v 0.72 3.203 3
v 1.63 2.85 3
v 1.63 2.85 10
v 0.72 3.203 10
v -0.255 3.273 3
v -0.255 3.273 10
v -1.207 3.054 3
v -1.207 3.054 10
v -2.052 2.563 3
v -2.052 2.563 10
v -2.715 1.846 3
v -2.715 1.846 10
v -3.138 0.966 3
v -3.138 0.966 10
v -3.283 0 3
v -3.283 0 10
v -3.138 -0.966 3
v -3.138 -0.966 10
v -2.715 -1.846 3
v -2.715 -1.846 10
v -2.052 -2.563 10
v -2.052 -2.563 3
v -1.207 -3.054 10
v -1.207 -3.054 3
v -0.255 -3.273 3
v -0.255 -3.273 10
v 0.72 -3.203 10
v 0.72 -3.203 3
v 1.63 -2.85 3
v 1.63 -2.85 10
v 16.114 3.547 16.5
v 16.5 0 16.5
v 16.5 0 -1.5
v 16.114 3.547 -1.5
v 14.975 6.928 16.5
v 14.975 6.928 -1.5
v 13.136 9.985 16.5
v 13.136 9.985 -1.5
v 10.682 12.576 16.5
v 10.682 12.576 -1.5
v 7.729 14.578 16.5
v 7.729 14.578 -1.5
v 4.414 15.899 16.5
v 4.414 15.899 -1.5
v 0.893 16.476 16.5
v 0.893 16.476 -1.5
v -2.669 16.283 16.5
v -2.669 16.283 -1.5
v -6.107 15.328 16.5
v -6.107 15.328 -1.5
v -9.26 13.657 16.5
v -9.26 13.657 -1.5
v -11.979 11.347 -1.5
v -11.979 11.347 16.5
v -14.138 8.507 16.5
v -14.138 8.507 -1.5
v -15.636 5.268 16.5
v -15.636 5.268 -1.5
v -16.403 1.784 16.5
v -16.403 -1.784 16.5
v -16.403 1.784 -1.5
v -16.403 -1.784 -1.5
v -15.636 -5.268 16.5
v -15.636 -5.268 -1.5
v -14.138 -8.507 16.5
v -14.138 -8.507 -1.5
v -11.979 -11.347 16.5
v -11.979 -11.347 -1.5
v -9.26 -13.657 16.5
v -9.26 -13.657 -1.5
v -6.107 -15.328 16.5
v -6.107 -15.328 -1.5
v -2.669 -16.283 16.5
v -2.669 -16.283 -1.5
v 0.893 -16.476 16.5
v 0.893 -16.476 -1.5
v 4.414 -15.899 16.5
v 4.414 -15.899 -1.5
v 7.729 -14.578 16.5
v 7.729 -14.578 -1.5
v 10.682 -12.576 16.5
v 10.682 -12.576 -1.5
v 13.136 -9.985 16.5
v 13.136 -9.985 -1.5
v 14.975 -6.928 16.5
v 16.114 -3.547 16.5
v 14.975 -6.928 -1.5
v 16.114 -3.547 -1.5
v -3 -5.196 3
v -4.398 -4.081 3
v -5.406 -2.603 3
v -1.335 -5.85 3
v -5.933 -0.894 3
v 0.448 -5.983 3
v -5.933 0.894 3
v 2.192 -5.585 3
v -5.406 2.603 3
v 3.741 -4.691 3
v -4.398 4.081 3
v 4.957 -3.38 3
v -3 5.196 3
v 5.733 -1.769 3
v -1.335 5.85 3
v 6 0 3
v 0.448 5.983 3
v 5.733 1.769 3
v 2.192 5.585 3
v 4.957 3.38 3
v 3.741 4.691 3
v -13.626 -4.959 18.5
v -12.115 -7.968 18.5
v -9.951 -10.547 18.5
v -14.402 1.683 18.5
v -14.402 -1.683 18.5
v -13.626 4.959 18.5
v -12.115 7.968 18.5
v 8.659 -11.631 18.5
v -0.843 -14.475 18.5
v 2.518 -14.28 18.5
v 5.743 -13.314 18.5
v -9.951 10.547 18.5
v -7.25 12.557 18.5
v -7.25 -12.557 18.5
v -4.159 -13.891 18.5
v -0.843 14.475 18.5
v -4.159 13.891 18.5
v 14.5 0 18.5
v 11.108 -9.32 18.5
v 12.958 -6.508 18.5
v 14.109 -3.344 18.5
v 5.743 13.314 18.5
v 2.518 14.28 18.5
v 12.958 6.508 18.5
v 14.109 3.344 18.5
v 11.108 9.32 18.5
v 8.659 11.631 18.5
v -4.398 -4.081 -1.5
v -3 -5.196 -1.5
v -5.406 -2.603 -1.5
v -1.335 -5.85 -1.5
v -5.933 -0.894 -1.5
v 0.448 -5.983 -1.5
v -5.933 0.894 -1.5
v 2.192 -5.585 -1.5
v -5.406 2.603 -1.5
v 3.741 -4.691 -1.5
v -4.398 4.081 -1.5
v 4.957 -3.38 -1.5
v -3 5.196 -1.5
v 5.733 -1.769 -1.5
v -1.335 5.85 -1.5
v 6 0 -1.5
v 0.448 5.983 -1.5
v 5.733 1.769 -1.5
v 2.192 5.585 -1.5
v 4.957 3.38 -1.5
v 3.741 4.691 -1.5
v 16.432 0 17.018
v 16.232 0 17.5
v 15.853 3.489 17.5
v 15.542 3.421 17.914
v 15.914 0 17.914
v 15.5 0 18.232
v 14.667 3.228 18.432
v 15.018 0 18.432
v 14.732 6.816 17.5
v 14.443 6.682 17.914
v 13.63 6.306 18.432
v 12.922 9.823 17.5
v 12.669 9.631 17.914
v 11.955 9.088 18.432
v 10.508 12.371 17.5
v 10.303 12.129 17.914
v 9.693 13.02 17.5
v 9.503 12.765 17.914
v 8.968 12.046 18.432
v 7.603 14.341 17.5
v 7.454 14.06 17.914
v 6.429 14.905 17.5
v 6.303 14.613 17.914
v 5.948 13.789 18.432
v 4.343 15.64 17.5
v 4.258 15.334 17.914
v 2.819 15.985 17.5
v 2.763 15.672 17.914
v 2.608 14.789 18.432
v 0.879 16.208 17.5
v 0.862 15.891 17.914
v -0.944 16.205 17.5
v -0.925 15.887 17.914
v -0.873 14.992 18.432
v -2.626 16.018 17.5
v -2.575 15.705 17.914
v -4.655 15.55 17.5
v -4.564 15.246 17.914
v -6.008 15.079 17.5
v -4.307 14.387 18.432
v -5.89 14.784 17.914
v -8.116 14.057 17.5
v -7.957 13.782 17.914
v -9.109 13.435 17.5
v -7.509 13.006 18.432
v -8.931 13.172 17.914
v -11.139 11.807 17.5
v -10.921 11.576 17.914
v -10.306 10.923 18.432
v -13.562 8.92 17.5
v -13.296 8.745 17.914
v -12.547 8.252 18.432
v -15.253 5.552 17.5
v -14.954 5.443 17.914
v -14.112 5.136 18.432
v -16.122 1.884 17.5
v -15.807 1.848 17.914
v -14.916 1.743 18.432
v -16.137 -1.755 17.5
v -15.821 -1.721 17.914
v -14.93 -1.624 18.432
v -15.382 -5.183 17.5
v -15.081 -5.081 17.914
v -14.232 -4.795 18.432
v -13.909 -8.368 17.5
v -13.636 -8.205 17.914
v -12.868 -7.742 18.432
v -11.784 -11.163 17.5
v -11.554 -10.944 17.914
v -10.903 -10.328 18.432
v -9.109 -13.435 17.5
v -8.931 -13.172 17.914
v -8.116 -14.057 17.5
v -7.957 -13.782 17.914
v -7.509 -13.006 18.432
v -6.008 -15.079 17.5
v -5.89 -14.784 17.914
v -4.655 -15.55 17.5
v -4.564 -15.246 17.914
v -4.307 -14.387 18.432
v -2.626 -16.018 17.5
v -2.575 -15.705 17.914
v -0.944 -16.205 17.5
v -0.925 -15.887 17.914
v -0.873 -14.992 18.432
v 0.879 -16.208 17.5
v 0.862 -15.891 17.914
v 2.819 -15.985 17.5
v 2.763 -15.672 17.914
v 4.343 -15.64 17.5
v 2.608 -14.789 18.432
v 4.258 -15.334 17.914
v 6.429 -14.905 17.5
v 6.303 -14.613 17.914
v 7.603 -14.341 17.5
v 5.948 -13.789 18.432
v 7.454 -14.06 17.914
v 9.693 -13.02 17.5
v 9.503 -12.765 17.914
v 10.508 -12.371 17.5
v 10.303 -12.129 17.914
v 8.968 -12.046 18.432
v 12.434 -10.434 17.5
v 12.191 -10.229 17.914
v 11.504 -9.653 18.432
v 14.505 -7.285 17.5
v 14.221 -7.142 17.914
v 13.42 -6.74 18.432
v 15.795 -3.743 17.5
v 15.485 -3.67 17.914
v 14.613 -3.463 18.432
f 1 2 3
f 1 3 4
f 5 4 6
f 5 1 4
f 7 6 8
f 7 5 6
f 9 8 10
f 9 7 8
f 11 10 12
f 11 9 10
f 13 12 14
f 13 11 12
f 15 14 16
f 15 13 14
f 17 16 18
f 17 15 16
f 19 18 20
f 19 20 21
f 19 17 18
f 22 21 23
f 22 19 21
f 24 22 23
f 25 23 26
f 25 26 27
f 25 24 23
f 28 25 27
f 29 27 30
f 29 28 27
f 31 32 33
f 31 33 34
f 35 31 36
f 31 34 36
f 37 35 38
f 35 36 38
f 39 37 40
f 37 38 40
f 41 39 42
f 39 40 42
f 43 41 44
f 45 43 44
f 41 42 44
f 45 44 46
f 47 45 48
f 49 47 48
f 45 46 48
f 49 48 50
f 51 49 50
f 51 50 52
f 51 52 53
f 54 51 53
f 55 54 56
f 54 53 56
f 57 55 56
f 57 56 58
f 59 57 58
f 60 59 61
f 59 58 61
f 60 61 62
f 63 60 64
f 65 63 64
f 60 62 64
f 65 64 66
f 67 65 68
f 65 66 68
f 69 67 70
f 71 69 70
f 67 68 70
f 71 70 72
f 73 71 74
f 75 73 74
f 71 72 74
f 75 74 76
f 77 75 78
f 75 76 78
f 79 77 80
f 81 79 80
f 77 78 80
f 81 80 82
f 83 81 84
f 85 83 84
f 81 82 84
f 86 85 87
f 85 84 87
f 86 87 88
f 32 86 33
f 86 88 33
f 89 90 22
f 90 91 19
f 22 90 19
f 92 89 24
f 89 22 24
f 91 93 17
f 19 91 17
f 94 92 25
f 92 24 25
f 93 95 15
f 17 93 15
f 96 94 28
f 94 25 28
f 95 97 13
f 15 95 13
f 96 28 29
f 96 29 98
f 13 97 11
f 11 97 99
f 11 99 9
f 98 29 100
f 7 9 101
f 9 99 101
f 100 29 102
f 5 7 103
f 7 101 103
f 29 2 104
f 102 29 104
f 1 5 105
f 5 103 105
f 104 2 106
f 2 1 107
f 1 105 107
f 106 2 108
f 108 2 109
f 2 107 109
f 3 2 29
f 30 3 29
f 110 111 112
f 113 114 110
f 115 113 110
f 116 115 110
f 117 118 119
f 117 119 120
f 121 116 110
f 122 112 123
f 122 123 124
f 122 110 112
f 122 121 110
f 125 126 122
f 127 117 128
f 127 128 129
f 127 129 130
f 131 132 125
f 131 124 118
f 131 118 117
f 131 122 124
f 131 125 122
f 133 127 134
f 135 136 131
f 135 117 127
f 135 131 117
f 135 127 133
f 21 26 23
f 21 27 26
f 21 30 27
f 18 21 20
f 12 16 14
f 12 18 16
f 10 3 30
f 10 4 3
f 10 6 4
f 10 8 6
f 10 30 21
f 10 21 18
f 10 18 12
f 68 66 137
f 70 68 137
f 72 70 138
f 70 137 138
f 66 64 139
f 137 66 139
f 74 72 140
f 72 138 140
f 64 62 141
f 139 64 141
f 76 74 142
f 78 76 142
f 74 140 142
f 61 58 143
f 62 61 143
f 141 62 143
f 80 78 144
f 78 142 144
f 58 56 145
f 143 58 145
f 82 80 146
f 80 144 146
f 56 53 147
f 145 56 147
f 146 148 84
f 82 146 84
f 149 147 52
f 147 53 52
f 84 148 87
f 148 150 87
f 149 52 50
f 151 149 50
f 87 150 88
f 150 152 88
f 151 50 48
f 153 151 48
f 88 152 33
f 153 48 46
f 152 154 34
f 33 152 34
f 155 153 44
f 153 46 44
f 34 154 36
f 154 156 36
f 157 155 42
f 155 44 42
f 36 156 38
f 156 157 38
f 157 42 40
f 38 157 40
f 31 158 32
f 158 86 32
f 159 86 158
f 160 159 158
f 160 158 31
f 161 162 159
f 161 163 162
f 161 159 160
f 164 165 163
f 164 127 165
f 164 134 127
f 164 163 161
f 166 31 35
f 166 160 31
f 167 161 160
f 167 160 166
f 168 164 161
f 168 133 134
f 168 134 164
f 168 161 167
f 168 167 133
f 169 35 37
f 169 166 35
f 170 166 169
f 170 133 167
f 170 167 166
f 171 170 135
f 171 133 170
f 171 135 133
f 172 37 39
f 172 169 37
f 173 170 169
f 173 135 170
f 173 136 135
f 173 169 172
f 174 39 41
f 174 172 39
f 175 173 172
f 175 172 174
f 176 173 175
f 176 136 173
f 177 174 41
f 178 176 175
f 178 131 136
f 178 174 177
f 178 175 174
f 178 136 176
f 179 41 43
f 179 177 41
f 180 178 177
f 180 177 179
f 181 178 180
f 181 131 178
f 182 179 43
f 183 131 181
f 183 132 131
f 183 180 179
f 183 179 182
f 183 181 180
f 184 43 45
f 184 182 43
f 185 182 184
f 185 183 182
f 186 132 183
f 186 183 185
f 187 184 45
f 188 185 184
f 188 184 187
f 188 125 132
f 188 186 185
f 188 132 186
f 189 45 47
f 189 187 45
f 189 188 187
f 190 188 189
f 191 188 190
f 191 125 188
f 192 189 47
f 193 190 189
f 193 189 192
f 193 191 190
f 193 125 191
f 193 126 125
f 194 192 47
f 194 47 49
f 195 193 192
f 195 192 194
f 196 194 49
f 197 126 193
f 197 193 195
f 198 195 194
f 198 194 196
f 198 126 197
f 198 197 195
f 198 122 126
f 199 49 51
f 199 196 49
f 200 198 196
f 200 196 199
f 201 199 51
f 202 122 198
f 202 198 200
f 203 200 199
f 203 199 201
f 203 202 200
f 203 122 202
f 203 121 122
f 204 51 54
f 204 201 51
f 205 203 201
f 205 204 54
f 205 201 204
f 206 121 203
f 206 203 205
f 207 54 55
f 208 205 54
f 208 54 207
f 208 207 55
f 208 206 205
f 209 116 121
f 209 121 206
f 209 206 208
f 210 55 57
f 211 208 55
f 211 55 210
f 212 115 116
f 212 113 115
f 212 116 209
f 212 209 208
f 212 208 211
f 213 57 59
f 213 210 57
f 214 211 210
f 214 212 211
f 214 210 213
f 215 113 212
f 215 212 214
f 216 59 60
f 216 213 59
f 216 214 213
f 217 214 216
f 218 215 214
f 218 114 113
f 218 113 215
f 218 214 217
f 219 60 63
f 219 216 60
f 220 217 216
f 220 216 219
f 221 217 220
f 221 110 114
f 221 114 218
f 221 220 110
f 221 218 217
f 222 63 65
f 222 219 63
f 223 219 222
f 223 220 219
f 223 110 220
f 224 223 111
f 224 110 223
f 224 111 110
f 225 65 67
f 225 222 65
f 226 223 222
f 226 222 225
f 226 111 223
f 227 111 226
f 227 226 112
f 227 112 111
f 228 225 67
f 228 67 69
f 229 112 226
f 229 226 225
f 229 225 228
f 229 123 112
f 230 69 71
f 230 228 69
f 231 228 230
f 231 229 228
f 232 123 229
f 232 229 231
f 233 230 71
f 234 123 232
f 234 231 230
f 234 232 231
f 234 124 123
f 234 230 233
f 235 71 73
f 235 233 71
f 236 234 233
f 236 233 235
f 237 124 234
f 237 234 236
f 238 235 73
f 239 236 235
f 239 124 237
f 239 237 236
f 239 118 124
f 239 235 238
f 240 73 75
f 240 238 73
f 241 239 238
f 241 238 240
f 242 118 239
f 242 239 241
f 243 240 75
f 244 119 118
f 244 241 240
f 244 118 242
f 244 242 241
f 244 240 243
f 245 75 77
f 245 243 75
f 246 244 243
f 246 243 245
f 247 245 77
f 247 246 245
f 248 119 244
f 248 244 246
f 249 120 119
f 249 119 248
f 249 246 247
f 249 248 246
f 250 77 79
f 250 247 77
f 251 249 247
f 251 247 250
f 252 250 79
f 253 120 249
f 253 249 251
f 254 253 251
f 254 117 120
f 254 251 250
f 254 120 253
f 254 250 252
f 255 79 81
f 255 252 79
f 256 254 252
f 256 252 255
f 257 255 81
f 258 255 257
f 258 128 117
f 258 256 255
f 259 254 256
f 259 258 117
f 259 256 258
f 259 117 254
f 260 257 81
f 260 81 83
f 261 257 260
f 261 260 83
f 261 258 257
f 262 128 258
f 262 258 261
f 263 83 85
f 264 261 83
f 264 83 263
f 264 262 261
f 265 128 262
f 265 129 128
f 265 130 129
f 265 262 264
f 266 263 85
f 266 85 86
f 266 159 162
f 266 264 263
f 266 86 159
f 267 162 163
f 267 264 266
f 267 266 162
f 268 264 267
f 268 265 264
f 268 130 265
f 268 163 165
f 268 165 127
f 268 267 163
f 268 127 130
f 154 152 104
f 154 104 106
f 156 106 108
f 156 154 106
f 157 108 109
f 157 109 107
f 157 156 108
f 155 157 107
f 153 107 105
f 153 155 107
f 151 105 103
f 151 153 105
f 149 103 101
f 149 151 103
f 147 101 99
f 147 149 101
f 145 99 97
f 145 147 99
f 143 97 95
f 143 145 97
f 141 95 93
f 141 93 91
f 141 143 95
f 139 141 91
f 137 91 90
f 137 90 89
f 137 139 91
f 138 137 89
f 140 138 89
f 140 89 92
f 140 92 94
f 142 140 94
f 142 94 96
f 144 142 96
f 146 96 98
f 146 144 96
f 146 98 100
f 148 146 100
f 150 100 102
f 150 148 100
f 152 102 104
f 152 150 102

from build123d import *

# Parameters (mm, degrees)
CYLINDER022_R     = 6
CYLINDER022_DEPTH = 4.5
PAD105_DEPTH      = 7
CYLINDER007_R     = 16.5
CYLINDER007_DEPTH = 20
FILLET013_R       = 2


with BuildPart() as jogwheel_cut001:
    # Cylinder022 → Cylinder022 (new body)
    with BuildSketch(Plane.XY.offset(-1.5)):
        Circle(CYLINDER022_R)
    extrude(amount=CYLINDER022_DEPTH)


with BuildPart() as jogwheel_cut:
    # Sketch082 → Pad105 (new body)
    with BuildSketch(Plane.XY):
        with BuildLine():
            Line((1.630229, 2.85), (1.630229, -2.85))
            ThreePointArc((1.630229, 2.85), (-3.283313, 0), (1.630229, -2.85))
        make_face()
    extrude(amount=PAD105_DEPTH)


with BuildPart() as jogwheel_cut_1:
    # Body018 placement: moved
    add(jogwheel_cut.part.moved(Location((0, 0, 3))))


with BuildPart() as jogwheel002:
    # Cylinder007 → Cylinder007 (new body)
    with BuildSketch(Plane.XY.offset(-1.5)):
        Circle(CYLINDER007_R)
    extrude(amount=CYLINDER007_DEPTH)

    # Cut018: cut JOGWHEEL_cut
    add(jogwheel_cut_1.part, mode=Mode.SUBTRACT)

    # Cut024: cut JOGWHEEL_cut001
    add(jogwheel_cut001.part, mode=Mode.SUBTRACT)

    # Fillet013
    fillet013_edges = [jogwheel002.edges().sort_by_distance(p)[0] for p in [
        (-16.5, 0, 18.5),
    ]]
    fillet(fillet013_edges, radius=FILLET013_R)


solid = jogwheel002.part
